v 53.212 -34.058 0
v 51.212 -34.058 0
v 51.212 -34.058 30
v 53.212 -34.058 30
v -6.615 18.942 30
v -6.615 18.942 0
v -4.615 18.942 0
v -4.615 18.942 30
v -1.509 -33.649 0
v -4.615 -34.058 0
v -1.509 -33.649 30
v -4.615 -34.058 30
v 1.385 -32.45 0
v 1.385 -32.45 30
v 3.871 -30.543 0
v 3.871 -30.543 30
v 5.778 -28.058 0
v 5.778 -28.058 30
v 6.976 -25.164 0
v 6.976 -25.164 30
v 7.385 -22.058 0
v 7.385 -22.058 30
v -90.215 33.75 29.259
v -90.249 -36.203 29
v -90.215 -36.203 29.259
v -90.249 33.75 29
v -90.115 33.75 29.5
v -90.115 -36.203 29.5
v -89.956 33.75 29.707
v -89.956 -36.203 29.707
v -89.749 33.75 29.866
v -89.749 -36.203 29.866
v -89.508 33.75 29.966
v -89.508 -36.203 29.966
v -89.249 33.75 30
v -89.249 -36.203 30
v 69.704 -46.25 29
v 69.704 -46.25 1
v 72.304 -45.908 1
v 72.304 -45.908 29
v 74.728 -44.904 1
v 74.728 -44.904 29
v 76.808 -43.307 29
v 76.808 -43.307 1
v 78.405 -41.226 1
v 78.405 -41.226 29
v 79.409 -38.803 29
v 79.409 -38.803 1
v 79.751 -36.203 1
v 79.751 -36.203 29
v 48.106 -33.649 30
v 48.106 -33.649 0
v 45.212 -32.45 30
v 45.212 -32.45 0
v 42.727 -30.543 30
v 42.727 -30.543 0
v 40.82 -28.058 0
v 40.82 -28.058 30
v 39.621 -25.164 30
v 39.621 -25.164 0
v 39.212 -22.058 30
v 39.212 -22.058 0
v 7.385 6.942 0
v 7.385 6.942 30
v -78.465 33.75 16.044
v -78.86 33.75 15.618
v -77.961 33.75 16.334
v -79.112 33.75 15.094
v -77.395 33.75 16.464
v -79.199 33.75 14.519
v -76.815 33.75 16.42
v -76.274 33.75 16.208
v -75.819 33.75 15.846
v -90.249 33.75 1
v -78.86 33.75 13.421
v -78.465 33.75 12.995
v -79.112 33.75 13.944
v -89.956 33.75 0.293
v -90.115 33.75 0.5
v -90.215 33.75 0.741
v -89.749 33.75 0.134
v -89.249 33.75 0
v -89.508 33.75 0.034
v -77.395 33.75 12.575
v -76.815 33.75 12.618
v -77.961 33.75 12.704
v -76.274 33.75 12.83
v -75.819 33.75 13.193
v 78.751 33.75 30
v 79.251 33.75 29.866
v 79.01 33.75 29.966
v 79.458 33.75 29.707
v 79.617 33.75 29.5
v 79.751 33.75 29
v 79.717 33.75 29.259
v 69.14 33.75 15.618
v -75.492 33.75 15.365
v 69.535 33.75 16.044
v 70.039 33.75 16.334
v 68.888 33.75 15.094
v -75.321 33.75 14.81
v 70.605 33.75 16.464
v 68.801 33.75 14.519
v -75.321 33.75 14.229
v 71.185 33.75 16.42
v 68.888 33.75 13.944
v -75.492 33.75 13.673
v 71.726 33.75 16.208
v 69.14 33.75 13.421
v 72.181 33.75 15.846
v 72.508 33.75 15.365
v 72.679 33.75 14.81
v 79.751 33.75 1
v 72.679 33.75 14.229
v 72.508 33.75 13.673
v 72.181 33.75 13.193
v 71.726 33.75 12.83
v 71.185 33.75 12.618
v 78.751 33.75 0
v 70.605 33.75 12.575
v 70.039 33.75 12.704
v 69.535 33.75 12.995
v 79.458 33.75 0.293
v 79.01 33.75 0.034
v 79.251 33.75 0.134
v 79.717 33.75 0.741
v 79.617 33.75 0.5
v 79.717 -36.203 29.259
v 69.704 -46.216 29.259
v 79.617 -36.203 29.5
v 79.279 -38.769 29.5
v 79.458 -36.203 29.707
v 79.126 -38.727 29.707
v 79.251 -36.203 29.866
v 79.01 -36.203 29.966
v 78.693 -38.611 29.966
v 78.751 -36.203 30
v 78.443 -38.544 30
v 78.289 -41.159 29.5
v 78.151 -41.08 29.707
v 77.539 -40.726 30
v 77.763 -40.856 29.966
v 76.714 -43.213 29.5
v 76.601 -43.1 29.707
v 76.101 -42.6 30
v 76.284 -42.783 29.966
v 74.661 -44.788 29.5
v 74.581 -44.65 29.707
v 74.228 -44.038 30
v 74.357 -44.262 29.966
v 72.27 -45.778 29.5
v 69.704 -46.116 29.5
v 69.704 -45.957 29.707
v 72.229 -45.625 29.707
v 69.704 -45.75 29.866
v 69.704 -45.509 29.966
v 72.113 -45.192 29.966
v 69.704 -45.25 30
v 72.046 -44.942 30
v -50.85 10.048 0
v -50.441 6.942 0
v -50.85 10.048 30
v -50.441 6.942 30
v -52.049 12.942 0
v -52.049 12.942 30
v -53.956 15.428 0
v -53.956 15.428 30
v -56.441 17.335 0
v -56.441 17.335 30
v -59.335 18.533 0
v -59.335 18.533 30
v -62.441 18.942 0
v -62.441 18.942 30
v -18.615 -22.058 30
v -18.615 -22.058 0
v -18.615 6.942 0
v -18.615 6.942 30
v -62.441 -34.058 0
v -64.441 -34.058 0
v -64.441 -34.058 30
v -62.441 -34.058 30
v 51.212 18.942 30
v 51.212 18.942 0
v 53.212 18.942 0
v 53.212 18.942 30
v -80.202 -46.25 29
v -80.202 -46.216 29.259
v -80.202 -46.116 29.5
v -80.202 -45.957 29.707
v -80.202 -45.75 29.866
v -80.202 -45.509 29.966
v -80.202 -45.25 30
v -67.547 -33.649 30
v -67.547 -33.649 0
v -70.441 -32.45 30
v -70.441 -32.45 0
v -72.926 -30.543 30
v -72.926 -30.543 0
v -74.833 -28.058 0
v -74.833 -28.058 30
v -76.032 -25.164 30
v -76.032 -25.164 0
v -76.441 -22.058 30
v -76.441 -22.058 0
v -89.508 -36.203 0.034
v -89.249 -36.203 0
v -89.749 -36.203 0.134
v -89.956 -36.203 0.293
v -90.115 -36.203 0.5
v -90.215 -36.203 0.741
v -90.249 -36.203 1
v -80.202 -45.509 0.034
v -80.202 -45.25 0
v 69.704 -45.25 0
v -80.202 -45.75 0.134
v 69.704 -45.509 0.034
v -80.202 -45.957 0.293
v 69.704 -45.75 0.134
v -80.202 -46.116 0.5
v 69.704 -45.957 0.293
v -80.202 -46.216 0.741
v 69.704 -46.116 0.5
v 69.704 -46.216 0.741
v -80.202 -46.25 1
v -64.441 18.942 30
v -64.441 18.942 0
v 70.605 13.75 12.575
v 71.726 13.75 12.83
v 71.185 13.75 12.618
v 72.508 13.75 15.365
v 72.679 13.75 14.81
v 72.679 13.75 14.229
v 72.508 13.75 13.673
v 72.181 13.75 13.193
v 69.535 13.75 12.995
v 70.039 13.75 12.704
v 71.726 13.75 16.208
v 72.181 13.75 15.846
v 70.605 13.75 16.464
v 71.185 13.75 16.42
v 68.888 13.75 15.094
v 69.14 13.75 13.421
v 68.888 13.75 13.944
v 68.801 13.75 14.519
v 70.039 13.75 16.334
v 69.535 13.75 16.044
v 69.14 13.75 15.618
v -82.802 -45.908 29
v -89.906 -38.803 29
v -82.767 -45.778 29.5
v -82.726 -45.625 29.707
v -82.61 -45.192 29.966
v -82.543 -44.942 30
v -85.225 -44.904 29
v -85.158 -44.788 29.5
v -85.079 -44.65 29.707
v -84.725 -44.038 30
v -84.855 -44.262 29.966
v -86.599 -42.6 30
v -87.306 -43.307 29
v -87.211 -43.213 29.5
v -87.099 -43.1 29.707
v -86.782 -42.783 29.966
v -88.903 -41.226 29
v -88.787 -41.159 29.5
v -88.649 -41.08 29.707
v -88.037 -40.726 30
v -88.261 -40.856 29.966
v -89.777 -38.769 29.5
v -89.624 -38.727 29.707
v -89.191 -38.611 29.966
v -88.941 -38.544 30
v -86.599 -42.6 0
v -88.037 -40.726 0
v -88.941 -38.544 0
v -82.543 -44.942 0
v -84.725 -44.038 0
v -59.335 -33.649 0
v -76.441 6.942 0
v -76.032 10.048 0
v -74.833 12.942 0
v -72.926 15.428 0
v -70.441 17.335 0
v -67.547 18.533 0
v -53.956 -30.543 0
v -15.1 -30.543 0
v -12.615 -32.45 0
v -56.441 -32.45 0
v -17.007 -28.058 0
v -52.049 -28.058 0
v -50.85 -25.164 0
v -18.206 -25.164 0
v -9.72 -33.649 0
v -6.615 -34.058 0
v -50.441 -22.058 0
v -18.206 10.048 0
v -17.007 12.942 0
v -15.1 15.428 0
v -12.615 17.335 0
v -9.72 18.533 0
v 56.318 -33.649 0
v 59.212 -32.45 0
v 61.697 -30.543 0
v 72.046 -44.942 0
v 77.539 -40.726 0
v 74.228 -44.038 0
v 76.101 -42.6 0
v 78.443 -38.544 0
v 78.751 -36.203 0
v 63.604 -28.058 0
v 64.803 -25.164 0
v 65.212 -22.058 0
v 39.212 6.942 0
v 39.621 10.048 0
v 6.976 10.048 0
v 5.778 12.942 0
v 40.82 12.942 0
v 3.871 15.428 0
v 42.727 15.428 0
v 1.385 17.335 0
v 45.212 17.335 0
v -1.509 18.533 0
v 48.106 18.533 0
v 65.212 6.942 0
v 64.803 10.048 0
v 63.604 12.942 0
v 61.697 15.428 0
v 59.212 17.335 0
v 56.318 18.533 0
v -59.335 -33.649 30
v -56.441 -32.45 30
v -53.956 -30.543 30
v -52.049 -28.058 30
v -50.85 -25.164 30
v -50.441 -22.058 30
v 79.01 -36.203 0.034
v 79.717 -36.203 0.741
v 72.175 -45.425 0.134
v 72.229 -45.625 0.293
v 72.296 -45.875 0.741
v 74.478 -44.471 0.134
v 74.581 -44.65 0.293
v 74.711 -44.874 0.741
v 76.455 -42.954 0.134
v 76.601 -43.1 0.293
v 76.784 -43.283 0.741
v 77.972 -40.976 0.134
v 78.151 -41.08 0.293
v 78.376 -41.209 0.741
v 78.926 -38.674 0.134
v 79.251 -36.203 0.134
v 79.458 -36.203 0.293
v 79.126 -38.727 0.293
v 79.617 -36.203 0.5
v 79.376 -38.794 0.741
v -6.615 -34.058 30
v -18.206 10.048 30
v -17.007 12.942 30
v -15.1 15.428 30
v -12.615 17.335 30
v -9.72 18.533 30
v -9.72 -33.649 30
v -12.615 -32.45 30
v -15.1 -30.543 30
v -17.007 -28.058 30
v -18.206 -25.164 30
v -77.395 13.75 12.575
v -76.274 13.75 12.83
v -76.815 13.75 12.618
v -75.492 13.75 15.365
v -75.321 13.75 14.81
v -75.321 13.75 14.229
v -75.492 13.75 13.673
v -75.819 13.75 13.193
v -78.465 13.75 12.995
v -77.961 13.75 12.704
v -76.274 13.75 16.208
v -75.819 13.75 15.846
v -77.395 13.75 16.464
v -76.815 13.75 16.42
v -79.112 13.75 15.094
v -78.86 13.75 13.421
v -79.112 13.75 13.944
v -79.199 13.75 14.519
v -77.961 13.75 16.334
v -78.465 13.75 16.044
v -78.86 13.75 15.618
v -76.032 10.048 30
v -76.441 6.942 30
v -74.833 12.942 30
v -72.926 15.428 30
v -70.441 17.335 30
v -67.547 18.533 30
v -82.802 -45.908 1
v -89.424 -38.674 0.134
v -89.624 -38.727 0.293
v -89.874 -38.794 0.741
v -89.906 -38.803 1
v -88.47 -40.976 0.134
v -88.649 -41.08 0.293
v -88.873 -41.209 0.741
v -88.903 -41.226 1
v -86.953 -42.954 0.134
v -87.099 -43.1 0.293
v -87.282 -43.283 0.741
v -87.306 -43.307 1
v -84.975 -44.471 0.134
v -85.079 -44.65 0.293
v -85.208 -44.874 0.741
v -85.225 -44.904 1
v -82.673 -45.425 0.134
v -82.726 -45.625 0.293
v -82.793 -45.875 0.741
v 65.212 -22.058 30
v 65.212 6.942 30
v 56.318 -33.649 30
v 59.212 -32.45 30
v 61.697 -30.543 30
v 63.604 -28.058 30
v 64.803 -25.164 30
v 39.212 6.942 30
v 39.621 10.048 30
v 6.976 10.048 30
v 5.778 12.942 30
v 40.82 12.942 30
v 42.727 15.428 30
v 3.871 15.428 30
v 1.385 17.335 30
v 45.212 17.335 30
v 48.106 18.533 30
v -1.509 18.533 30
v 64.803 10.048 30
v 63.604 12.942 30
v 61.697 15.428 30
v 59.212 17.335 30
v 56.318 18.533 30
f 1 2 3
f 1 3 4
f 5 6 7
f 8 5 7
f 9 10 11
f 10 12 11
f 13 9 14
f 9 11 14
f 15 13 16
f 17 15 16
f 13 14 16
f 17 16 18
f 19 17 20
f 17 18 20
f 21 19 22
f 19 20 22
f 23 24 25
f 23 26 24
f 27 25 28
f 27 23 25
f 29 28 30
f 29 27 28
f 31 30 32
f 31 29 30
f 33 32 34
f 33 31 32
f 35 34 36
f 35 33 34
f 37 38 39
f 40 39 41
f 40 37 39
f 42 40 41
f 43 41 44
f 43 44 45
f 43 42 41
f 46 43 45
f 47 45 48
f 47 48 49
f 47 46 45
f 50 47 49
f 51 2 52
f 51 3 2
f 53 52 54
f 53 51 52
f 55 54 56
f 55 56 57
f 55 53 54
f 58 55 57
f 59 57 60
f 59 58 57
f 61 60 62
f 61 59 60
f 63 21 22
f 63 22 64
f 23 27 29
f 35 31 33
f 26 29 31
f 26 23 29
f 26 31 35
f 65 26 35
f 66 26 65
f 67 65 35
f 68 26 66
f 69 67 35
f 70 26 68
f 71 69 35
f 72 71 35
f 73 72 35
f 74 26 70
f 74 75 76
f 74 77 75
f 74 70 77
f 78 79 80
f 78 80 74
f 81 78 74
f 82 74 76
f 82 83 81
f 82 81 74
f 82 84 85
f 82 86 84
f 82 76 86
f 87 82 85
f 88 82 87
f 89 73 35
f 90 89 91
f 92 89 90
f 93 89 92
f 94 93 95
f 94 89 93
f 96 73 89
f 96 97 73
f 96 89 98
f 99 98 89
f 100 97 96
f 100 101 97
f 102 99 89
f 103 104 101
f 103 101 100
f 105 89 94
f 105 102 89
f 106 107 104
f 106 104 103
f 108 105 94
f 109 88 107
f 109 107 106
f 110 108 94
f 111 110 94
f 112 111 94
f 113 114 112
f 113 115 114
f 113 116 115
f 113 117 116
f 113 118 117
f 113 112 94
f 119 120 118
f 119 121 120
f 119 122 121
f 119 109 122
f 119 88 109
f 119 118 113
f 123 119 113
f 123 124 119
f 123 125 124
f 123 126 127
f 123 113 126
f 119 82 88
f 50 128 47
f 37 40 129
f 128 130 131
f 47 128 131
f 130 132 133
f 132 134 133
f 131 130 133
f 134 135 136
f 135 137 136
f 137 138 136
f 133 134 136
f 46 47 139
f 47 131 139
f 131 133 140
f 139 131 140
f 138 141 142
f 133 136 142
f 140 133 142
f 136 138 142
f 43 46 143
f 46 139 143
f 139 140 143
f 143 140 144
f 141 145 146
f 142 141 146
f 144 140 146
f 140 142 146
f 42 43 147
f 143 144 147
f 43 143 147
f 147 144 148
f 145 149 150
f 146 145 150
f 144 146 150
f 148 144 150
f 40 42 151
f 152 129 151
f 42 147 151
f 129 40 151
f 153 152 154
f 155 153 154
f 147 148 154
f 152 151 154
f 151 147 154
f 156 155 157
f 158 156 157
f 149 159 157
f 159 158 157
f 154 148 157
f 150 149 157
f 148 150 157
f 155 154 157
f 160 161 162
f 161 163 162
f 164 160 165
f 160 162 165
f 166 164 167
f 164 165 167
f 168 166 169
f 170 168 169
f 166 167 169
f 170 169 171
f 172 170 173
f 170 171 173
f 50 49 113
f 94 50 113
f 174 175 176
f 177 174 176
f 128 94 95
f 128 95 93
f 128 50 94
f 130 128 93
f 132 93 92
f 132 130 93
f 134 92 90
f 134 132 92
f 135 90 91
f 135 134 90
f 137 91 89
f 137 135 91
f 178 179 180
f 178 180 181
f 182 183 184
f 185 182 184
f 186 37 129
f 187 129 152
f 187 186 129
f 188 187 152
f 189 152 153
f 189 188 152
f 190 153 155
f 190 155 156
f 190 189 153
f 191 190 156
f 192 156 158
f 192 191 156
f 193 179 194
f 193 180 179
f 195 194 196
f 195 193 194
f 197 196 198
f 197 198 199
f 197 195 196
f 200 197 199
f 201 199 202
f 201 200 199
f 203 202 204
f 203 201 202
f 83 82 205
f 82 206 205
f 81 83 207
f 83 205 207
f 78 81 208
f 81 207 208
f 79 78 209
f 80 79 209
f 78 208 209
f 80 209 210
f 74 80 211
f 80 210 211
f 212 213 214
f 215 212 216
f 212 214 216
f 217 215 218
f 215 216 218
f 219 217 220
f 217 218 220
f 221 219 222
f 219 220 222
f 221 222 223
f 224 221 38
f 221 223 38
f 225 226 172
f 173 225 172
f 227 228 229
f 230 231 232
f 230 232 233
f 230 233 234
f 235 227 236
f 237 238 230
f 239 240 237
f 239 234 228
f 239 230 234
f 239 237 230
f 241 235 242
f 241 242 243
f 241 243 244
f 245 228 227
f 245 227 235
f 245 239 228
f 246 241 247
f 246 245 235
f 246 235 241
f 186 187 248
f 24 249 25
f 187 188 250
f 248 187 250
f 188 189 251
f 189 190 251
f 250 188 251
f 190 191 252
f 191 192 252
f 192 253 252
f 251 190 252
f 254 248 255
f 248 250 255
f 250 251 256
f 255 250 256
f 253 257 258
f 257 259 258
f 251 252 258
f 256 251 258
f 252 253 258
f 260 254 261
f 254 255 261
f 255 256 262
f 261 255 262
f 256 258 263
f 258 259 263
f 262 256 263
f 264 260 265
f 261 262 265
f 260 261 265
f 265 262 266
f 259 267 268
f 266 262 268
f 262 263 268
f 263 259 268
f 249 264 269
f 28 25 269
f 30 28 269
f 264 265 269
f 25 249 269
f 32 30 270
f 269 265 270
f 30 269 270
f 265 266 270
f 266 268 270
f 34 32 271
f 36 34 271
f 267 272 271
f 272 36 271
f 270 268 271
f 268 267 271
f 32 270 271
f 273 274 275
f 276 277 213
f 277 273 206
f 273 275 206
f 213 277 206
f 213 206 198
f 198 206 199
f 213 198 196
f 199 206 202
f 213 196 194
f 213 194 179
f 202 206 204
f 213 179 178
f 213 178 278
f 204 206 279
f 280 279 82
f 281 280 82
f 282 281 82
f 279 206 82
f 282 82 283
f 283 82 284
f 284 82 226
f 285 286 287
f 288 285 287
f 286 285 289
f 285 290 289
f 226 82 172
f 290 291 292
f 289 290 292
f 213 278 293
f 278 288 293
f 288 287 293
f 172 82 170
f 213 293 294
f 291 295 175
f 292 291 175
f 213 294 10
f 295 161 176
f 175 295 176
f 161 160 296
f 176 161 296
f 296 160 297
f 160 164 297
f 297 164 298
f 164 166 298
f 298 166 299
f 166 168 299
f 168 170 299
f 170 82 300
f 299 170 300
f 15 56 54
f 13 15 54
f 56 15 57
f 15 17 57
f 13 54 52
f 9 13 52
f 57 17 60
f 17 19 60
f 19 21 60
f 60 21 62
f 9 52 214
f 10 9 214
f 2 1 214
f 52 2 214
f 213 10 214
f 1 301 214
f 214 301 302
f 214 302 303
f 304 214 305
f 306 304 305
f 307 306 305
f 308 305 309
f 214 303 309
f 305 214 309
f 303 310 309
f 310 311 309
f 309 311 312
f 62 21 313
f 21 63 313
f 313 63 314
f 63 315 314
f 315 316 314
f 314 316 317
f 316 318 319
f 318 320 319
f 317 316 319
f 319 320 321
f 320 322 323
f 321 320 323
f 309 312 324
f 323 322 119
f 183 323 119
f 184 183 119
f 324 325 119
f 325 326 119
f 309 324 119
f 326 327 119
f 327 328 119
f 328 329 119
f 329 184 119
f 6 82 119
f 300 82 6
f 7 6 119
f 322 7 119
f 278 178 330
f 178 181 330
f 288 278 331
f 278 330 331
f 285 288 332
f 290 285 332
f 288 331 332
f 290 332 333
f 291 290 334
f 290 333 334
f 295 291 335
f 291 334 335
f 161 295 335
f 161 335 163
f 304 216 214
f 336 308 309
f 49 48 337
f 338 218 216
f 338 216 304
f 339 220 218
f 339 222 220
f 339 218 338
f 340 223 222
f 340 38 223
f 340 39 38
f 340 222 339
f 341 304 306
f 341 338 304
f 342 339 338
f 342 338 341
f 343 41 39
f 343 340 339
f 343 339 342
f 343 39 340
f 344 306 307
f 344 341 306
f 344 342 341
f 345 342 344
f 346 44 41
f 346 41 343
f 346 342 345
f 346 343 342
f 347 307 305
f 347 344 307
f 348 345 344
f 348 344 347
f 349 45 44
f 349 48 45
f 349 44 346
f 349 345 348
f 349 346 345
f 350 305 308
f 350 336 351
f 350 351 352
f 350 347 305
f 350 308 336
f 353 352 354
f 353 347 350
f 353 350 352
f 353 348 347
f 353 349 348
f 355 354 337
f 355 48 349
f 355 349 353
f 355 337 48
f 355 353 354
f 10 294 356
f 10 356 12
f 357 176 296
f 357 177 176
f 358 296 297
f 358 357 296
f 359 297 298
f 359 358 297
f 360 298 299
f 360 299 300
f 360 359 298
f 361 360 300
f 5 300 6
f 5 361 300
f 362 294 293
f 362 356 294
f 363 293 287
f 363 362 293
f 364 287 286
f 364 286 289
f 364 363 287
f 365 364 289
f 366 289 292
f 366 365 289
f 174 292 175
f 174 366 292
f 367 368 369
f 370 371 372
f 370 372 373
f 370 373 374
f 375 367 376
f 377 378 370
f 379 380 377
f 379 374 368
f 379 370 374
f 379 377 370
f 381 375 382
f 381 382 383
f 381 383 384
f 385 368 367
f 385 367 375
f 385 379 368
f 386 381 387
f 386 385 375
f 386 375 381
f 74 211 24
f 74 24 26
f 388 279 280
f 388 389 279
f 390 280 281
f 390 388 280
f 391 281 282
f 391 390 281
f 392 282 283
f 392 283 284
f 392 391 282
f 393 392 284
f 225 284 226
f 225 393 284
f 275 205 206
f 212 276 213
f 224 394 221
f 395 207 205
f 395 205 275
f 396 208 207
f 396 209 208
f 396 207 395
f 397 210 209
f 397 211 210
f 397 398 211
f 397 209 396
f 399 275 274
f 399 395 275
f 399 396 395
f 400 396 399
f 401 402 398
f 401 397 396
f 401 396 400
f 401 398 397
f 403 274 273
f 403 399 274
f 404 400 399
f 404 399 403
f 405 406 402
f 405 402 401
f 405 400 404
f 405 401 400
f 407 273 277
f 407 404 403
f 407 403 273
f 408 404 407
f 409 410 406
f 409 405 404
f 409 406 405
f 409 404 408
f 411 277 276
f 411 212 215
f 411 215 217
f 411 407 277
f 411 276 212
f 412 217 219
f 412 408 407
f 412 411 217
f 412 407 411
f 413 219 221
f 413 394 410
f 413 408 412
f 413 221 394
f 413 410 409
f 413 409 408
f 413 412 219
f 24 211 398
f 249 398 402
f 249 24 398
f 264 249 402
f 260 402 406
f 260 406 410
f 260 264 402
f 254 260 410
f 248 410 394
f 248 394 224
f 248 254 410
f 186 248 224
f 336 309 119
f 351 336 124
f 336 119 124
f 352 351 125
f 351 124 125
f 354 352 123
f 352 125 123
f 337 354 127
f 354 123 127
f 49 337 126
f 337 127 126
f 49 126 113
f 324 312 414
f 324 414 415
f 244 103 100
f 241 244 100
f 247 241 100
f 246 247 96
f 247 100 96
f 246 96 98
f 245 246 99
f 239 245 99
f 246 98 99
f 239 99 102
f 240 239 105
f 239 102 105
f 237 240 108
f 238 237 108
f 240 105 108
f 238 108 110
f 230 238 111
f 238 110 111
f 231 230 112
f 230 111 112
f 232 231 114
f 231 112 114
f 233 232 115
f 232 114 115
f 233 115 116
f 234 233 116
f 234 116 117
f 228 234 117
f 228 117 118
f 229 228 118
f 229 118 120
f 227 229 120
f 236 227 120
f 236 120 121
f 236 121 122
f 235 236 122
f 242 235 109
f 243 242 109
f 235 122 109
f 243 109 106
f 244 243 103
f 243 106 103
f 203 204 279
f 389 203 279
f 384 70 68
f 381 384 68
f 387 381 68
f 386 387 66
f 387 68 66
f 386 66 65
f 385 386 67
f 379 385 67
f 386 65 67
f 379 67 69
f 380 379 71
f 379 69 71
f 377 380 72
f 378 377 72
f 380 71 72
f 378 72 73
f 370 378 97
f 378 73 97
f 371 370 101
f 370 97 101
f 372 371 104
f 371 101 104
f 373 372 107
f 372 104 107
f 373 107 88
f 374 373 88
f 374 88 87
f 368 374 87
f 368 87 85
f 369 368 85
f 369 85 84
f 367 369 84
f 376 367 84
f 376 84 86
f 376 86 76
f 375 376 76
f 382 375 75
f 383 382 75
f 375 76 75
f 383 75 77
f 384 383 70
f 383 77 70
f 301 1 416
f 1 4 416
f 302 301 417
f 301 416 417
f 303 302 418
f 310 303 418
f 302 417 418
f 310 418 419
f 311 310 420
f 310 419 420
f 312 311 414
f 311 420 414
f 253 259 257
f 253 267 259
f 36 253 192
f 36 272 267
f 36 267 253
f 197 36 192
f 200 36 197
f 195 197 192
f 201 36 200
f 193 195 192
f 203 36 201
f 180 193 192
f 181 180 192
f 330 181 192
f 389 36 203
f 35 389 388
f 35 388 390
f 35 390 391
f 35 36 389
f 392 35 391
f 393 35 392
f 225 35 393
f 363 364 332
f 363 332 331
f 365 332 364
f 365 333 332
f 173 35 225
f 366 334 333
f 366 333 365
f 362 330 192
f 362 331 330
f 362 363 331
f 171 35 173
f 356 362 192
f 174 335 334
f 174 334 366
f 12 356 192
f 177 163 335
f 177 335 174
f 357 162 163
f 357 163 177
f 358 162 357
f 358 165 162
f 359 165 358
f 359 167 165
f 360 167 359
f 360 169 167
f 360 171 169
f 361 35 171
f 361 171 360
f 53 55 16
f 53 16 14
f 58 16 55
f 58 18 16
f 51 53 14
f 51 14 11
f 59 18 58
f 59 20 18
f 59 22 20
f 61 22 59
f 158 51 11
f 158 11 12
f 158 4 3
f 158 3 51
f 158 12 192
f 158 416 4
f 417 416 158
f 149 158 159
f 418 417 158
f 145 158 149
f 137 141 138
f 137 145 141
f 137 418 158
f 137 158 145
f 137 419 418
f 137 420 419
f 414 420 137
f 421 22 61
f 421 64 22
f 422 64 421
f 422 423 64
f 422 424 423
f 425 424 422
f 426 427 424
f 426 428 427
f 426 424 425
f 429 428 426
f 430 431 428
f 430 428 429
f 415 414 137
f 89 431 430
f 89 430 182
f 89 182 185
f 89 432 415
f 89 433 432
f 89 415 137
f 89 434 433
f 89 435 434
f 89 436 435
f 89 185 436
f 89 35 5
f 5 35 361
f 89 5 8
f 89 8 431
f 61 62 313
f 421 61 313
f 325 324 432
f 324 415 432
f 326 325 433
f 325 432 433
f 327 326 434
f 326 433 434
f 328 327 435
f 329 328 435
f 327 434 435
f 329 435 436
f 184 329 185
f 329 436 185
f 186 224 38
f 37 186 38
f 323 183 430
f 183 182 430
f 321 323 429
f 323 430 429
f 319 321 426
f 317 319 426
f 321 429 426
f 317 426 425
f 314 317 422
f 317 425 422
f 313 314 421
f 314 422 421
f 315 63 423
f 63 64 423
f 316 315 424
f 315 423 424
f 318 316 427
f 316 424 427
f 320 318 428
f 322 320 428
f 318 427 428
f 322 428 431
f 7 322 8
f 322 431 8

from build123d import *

# Parameters (mm, degrees)
F0_W     = 170
F0_H     = 80
F0_W_2   = 26
F0_H_2   = 53
F1_DEPTH = 30
F2_R     = 10.0472084404
F3_R     = 12
F4_R     = 1
F5_R     = 1.95
F6_DEPTH = 20


with BuildPart() as f1:
    # F0 (on Top) → F1 (new body)
    with BuildSketch(Plane.XY):
        with Locations((-5.2488362789, -6.2499986589)):
            Rectangle(F0_W, F0_H)
        with Locations((-63.4411496222, -7.5576923192)):
            Rectangle(F0_W_2, F0_H_2, mode=Mode.SUBTRACT)
        with Locations((-5.6146496222, -7.5576923192)):
            Rectangle(F0_W_2, F0_H_2, mode=Mode.SUBTRACT)
        with Locations((52.2118503778, -7.5576923192)):
            Rectangle(F0_W_2, F0_H_2, mode=Mode.SUBTRACT)
    extrude(amount=F1_DEPTH)

    # F2
    f2_edges = [f1.edges().sort_by_distance(p)[0] for p in [
        (-90.248836, -46.249999, 15),
        (79.751164, -46.249999, 15),
    ]]
    fillet(f2_edges, radius=F2_R)

    # F3
    f3_edges = [f1.edges().sort_by_distance(p)[0] for p in [
        (-50.44115, 18.942308, 15),
        (7.38535, 18.942308, 15),
        (65.21185, 18.942308, 15),
        (-76.44115, 18.942308, 15),
        (-18.61465, 18.942308, 15),
        (39.21185, 18.942308, 15),
        (39.21185, -34.057692, 15),
        (-18.61465, -34.057692, 15),
        (-76.44115, -34.057692, 15),
        (-50.44115, -34.057692, 15),
        (7.38535, -34.057692, 15),
        (65.21185, -34.057692, 15),
    ]]
    fillet(f3_edges, radius=F3_R)

    # F4
    f4_edges = [f1.edges().sort_by_distance(p)[0] for p in [
        (-90.248836, -1.226394, 30),
        (-87.306077, -43.307239, 30),
        (79.751164, -1.226394, 0),
    ]]
    fillet(f4_edges, radius=F4_R)

    # F5 (on face) → F6 (cut)
    with BuildSketch(Plane(origin=(0, 33.7500013411, 0), x_dir=(-1, 0, 0), z_dir=(0, 1, 0))):
        with Locations((-70.7511637211, 14.5192313939)):
            Circle(F5_R)
        with Locations((77.2488362789, 14.5192313939)):
            Circle(F5_R)
    extrude(amount=-F6_DEPTH, mode=Mode.SUBTRACT)


solid = f1.part
